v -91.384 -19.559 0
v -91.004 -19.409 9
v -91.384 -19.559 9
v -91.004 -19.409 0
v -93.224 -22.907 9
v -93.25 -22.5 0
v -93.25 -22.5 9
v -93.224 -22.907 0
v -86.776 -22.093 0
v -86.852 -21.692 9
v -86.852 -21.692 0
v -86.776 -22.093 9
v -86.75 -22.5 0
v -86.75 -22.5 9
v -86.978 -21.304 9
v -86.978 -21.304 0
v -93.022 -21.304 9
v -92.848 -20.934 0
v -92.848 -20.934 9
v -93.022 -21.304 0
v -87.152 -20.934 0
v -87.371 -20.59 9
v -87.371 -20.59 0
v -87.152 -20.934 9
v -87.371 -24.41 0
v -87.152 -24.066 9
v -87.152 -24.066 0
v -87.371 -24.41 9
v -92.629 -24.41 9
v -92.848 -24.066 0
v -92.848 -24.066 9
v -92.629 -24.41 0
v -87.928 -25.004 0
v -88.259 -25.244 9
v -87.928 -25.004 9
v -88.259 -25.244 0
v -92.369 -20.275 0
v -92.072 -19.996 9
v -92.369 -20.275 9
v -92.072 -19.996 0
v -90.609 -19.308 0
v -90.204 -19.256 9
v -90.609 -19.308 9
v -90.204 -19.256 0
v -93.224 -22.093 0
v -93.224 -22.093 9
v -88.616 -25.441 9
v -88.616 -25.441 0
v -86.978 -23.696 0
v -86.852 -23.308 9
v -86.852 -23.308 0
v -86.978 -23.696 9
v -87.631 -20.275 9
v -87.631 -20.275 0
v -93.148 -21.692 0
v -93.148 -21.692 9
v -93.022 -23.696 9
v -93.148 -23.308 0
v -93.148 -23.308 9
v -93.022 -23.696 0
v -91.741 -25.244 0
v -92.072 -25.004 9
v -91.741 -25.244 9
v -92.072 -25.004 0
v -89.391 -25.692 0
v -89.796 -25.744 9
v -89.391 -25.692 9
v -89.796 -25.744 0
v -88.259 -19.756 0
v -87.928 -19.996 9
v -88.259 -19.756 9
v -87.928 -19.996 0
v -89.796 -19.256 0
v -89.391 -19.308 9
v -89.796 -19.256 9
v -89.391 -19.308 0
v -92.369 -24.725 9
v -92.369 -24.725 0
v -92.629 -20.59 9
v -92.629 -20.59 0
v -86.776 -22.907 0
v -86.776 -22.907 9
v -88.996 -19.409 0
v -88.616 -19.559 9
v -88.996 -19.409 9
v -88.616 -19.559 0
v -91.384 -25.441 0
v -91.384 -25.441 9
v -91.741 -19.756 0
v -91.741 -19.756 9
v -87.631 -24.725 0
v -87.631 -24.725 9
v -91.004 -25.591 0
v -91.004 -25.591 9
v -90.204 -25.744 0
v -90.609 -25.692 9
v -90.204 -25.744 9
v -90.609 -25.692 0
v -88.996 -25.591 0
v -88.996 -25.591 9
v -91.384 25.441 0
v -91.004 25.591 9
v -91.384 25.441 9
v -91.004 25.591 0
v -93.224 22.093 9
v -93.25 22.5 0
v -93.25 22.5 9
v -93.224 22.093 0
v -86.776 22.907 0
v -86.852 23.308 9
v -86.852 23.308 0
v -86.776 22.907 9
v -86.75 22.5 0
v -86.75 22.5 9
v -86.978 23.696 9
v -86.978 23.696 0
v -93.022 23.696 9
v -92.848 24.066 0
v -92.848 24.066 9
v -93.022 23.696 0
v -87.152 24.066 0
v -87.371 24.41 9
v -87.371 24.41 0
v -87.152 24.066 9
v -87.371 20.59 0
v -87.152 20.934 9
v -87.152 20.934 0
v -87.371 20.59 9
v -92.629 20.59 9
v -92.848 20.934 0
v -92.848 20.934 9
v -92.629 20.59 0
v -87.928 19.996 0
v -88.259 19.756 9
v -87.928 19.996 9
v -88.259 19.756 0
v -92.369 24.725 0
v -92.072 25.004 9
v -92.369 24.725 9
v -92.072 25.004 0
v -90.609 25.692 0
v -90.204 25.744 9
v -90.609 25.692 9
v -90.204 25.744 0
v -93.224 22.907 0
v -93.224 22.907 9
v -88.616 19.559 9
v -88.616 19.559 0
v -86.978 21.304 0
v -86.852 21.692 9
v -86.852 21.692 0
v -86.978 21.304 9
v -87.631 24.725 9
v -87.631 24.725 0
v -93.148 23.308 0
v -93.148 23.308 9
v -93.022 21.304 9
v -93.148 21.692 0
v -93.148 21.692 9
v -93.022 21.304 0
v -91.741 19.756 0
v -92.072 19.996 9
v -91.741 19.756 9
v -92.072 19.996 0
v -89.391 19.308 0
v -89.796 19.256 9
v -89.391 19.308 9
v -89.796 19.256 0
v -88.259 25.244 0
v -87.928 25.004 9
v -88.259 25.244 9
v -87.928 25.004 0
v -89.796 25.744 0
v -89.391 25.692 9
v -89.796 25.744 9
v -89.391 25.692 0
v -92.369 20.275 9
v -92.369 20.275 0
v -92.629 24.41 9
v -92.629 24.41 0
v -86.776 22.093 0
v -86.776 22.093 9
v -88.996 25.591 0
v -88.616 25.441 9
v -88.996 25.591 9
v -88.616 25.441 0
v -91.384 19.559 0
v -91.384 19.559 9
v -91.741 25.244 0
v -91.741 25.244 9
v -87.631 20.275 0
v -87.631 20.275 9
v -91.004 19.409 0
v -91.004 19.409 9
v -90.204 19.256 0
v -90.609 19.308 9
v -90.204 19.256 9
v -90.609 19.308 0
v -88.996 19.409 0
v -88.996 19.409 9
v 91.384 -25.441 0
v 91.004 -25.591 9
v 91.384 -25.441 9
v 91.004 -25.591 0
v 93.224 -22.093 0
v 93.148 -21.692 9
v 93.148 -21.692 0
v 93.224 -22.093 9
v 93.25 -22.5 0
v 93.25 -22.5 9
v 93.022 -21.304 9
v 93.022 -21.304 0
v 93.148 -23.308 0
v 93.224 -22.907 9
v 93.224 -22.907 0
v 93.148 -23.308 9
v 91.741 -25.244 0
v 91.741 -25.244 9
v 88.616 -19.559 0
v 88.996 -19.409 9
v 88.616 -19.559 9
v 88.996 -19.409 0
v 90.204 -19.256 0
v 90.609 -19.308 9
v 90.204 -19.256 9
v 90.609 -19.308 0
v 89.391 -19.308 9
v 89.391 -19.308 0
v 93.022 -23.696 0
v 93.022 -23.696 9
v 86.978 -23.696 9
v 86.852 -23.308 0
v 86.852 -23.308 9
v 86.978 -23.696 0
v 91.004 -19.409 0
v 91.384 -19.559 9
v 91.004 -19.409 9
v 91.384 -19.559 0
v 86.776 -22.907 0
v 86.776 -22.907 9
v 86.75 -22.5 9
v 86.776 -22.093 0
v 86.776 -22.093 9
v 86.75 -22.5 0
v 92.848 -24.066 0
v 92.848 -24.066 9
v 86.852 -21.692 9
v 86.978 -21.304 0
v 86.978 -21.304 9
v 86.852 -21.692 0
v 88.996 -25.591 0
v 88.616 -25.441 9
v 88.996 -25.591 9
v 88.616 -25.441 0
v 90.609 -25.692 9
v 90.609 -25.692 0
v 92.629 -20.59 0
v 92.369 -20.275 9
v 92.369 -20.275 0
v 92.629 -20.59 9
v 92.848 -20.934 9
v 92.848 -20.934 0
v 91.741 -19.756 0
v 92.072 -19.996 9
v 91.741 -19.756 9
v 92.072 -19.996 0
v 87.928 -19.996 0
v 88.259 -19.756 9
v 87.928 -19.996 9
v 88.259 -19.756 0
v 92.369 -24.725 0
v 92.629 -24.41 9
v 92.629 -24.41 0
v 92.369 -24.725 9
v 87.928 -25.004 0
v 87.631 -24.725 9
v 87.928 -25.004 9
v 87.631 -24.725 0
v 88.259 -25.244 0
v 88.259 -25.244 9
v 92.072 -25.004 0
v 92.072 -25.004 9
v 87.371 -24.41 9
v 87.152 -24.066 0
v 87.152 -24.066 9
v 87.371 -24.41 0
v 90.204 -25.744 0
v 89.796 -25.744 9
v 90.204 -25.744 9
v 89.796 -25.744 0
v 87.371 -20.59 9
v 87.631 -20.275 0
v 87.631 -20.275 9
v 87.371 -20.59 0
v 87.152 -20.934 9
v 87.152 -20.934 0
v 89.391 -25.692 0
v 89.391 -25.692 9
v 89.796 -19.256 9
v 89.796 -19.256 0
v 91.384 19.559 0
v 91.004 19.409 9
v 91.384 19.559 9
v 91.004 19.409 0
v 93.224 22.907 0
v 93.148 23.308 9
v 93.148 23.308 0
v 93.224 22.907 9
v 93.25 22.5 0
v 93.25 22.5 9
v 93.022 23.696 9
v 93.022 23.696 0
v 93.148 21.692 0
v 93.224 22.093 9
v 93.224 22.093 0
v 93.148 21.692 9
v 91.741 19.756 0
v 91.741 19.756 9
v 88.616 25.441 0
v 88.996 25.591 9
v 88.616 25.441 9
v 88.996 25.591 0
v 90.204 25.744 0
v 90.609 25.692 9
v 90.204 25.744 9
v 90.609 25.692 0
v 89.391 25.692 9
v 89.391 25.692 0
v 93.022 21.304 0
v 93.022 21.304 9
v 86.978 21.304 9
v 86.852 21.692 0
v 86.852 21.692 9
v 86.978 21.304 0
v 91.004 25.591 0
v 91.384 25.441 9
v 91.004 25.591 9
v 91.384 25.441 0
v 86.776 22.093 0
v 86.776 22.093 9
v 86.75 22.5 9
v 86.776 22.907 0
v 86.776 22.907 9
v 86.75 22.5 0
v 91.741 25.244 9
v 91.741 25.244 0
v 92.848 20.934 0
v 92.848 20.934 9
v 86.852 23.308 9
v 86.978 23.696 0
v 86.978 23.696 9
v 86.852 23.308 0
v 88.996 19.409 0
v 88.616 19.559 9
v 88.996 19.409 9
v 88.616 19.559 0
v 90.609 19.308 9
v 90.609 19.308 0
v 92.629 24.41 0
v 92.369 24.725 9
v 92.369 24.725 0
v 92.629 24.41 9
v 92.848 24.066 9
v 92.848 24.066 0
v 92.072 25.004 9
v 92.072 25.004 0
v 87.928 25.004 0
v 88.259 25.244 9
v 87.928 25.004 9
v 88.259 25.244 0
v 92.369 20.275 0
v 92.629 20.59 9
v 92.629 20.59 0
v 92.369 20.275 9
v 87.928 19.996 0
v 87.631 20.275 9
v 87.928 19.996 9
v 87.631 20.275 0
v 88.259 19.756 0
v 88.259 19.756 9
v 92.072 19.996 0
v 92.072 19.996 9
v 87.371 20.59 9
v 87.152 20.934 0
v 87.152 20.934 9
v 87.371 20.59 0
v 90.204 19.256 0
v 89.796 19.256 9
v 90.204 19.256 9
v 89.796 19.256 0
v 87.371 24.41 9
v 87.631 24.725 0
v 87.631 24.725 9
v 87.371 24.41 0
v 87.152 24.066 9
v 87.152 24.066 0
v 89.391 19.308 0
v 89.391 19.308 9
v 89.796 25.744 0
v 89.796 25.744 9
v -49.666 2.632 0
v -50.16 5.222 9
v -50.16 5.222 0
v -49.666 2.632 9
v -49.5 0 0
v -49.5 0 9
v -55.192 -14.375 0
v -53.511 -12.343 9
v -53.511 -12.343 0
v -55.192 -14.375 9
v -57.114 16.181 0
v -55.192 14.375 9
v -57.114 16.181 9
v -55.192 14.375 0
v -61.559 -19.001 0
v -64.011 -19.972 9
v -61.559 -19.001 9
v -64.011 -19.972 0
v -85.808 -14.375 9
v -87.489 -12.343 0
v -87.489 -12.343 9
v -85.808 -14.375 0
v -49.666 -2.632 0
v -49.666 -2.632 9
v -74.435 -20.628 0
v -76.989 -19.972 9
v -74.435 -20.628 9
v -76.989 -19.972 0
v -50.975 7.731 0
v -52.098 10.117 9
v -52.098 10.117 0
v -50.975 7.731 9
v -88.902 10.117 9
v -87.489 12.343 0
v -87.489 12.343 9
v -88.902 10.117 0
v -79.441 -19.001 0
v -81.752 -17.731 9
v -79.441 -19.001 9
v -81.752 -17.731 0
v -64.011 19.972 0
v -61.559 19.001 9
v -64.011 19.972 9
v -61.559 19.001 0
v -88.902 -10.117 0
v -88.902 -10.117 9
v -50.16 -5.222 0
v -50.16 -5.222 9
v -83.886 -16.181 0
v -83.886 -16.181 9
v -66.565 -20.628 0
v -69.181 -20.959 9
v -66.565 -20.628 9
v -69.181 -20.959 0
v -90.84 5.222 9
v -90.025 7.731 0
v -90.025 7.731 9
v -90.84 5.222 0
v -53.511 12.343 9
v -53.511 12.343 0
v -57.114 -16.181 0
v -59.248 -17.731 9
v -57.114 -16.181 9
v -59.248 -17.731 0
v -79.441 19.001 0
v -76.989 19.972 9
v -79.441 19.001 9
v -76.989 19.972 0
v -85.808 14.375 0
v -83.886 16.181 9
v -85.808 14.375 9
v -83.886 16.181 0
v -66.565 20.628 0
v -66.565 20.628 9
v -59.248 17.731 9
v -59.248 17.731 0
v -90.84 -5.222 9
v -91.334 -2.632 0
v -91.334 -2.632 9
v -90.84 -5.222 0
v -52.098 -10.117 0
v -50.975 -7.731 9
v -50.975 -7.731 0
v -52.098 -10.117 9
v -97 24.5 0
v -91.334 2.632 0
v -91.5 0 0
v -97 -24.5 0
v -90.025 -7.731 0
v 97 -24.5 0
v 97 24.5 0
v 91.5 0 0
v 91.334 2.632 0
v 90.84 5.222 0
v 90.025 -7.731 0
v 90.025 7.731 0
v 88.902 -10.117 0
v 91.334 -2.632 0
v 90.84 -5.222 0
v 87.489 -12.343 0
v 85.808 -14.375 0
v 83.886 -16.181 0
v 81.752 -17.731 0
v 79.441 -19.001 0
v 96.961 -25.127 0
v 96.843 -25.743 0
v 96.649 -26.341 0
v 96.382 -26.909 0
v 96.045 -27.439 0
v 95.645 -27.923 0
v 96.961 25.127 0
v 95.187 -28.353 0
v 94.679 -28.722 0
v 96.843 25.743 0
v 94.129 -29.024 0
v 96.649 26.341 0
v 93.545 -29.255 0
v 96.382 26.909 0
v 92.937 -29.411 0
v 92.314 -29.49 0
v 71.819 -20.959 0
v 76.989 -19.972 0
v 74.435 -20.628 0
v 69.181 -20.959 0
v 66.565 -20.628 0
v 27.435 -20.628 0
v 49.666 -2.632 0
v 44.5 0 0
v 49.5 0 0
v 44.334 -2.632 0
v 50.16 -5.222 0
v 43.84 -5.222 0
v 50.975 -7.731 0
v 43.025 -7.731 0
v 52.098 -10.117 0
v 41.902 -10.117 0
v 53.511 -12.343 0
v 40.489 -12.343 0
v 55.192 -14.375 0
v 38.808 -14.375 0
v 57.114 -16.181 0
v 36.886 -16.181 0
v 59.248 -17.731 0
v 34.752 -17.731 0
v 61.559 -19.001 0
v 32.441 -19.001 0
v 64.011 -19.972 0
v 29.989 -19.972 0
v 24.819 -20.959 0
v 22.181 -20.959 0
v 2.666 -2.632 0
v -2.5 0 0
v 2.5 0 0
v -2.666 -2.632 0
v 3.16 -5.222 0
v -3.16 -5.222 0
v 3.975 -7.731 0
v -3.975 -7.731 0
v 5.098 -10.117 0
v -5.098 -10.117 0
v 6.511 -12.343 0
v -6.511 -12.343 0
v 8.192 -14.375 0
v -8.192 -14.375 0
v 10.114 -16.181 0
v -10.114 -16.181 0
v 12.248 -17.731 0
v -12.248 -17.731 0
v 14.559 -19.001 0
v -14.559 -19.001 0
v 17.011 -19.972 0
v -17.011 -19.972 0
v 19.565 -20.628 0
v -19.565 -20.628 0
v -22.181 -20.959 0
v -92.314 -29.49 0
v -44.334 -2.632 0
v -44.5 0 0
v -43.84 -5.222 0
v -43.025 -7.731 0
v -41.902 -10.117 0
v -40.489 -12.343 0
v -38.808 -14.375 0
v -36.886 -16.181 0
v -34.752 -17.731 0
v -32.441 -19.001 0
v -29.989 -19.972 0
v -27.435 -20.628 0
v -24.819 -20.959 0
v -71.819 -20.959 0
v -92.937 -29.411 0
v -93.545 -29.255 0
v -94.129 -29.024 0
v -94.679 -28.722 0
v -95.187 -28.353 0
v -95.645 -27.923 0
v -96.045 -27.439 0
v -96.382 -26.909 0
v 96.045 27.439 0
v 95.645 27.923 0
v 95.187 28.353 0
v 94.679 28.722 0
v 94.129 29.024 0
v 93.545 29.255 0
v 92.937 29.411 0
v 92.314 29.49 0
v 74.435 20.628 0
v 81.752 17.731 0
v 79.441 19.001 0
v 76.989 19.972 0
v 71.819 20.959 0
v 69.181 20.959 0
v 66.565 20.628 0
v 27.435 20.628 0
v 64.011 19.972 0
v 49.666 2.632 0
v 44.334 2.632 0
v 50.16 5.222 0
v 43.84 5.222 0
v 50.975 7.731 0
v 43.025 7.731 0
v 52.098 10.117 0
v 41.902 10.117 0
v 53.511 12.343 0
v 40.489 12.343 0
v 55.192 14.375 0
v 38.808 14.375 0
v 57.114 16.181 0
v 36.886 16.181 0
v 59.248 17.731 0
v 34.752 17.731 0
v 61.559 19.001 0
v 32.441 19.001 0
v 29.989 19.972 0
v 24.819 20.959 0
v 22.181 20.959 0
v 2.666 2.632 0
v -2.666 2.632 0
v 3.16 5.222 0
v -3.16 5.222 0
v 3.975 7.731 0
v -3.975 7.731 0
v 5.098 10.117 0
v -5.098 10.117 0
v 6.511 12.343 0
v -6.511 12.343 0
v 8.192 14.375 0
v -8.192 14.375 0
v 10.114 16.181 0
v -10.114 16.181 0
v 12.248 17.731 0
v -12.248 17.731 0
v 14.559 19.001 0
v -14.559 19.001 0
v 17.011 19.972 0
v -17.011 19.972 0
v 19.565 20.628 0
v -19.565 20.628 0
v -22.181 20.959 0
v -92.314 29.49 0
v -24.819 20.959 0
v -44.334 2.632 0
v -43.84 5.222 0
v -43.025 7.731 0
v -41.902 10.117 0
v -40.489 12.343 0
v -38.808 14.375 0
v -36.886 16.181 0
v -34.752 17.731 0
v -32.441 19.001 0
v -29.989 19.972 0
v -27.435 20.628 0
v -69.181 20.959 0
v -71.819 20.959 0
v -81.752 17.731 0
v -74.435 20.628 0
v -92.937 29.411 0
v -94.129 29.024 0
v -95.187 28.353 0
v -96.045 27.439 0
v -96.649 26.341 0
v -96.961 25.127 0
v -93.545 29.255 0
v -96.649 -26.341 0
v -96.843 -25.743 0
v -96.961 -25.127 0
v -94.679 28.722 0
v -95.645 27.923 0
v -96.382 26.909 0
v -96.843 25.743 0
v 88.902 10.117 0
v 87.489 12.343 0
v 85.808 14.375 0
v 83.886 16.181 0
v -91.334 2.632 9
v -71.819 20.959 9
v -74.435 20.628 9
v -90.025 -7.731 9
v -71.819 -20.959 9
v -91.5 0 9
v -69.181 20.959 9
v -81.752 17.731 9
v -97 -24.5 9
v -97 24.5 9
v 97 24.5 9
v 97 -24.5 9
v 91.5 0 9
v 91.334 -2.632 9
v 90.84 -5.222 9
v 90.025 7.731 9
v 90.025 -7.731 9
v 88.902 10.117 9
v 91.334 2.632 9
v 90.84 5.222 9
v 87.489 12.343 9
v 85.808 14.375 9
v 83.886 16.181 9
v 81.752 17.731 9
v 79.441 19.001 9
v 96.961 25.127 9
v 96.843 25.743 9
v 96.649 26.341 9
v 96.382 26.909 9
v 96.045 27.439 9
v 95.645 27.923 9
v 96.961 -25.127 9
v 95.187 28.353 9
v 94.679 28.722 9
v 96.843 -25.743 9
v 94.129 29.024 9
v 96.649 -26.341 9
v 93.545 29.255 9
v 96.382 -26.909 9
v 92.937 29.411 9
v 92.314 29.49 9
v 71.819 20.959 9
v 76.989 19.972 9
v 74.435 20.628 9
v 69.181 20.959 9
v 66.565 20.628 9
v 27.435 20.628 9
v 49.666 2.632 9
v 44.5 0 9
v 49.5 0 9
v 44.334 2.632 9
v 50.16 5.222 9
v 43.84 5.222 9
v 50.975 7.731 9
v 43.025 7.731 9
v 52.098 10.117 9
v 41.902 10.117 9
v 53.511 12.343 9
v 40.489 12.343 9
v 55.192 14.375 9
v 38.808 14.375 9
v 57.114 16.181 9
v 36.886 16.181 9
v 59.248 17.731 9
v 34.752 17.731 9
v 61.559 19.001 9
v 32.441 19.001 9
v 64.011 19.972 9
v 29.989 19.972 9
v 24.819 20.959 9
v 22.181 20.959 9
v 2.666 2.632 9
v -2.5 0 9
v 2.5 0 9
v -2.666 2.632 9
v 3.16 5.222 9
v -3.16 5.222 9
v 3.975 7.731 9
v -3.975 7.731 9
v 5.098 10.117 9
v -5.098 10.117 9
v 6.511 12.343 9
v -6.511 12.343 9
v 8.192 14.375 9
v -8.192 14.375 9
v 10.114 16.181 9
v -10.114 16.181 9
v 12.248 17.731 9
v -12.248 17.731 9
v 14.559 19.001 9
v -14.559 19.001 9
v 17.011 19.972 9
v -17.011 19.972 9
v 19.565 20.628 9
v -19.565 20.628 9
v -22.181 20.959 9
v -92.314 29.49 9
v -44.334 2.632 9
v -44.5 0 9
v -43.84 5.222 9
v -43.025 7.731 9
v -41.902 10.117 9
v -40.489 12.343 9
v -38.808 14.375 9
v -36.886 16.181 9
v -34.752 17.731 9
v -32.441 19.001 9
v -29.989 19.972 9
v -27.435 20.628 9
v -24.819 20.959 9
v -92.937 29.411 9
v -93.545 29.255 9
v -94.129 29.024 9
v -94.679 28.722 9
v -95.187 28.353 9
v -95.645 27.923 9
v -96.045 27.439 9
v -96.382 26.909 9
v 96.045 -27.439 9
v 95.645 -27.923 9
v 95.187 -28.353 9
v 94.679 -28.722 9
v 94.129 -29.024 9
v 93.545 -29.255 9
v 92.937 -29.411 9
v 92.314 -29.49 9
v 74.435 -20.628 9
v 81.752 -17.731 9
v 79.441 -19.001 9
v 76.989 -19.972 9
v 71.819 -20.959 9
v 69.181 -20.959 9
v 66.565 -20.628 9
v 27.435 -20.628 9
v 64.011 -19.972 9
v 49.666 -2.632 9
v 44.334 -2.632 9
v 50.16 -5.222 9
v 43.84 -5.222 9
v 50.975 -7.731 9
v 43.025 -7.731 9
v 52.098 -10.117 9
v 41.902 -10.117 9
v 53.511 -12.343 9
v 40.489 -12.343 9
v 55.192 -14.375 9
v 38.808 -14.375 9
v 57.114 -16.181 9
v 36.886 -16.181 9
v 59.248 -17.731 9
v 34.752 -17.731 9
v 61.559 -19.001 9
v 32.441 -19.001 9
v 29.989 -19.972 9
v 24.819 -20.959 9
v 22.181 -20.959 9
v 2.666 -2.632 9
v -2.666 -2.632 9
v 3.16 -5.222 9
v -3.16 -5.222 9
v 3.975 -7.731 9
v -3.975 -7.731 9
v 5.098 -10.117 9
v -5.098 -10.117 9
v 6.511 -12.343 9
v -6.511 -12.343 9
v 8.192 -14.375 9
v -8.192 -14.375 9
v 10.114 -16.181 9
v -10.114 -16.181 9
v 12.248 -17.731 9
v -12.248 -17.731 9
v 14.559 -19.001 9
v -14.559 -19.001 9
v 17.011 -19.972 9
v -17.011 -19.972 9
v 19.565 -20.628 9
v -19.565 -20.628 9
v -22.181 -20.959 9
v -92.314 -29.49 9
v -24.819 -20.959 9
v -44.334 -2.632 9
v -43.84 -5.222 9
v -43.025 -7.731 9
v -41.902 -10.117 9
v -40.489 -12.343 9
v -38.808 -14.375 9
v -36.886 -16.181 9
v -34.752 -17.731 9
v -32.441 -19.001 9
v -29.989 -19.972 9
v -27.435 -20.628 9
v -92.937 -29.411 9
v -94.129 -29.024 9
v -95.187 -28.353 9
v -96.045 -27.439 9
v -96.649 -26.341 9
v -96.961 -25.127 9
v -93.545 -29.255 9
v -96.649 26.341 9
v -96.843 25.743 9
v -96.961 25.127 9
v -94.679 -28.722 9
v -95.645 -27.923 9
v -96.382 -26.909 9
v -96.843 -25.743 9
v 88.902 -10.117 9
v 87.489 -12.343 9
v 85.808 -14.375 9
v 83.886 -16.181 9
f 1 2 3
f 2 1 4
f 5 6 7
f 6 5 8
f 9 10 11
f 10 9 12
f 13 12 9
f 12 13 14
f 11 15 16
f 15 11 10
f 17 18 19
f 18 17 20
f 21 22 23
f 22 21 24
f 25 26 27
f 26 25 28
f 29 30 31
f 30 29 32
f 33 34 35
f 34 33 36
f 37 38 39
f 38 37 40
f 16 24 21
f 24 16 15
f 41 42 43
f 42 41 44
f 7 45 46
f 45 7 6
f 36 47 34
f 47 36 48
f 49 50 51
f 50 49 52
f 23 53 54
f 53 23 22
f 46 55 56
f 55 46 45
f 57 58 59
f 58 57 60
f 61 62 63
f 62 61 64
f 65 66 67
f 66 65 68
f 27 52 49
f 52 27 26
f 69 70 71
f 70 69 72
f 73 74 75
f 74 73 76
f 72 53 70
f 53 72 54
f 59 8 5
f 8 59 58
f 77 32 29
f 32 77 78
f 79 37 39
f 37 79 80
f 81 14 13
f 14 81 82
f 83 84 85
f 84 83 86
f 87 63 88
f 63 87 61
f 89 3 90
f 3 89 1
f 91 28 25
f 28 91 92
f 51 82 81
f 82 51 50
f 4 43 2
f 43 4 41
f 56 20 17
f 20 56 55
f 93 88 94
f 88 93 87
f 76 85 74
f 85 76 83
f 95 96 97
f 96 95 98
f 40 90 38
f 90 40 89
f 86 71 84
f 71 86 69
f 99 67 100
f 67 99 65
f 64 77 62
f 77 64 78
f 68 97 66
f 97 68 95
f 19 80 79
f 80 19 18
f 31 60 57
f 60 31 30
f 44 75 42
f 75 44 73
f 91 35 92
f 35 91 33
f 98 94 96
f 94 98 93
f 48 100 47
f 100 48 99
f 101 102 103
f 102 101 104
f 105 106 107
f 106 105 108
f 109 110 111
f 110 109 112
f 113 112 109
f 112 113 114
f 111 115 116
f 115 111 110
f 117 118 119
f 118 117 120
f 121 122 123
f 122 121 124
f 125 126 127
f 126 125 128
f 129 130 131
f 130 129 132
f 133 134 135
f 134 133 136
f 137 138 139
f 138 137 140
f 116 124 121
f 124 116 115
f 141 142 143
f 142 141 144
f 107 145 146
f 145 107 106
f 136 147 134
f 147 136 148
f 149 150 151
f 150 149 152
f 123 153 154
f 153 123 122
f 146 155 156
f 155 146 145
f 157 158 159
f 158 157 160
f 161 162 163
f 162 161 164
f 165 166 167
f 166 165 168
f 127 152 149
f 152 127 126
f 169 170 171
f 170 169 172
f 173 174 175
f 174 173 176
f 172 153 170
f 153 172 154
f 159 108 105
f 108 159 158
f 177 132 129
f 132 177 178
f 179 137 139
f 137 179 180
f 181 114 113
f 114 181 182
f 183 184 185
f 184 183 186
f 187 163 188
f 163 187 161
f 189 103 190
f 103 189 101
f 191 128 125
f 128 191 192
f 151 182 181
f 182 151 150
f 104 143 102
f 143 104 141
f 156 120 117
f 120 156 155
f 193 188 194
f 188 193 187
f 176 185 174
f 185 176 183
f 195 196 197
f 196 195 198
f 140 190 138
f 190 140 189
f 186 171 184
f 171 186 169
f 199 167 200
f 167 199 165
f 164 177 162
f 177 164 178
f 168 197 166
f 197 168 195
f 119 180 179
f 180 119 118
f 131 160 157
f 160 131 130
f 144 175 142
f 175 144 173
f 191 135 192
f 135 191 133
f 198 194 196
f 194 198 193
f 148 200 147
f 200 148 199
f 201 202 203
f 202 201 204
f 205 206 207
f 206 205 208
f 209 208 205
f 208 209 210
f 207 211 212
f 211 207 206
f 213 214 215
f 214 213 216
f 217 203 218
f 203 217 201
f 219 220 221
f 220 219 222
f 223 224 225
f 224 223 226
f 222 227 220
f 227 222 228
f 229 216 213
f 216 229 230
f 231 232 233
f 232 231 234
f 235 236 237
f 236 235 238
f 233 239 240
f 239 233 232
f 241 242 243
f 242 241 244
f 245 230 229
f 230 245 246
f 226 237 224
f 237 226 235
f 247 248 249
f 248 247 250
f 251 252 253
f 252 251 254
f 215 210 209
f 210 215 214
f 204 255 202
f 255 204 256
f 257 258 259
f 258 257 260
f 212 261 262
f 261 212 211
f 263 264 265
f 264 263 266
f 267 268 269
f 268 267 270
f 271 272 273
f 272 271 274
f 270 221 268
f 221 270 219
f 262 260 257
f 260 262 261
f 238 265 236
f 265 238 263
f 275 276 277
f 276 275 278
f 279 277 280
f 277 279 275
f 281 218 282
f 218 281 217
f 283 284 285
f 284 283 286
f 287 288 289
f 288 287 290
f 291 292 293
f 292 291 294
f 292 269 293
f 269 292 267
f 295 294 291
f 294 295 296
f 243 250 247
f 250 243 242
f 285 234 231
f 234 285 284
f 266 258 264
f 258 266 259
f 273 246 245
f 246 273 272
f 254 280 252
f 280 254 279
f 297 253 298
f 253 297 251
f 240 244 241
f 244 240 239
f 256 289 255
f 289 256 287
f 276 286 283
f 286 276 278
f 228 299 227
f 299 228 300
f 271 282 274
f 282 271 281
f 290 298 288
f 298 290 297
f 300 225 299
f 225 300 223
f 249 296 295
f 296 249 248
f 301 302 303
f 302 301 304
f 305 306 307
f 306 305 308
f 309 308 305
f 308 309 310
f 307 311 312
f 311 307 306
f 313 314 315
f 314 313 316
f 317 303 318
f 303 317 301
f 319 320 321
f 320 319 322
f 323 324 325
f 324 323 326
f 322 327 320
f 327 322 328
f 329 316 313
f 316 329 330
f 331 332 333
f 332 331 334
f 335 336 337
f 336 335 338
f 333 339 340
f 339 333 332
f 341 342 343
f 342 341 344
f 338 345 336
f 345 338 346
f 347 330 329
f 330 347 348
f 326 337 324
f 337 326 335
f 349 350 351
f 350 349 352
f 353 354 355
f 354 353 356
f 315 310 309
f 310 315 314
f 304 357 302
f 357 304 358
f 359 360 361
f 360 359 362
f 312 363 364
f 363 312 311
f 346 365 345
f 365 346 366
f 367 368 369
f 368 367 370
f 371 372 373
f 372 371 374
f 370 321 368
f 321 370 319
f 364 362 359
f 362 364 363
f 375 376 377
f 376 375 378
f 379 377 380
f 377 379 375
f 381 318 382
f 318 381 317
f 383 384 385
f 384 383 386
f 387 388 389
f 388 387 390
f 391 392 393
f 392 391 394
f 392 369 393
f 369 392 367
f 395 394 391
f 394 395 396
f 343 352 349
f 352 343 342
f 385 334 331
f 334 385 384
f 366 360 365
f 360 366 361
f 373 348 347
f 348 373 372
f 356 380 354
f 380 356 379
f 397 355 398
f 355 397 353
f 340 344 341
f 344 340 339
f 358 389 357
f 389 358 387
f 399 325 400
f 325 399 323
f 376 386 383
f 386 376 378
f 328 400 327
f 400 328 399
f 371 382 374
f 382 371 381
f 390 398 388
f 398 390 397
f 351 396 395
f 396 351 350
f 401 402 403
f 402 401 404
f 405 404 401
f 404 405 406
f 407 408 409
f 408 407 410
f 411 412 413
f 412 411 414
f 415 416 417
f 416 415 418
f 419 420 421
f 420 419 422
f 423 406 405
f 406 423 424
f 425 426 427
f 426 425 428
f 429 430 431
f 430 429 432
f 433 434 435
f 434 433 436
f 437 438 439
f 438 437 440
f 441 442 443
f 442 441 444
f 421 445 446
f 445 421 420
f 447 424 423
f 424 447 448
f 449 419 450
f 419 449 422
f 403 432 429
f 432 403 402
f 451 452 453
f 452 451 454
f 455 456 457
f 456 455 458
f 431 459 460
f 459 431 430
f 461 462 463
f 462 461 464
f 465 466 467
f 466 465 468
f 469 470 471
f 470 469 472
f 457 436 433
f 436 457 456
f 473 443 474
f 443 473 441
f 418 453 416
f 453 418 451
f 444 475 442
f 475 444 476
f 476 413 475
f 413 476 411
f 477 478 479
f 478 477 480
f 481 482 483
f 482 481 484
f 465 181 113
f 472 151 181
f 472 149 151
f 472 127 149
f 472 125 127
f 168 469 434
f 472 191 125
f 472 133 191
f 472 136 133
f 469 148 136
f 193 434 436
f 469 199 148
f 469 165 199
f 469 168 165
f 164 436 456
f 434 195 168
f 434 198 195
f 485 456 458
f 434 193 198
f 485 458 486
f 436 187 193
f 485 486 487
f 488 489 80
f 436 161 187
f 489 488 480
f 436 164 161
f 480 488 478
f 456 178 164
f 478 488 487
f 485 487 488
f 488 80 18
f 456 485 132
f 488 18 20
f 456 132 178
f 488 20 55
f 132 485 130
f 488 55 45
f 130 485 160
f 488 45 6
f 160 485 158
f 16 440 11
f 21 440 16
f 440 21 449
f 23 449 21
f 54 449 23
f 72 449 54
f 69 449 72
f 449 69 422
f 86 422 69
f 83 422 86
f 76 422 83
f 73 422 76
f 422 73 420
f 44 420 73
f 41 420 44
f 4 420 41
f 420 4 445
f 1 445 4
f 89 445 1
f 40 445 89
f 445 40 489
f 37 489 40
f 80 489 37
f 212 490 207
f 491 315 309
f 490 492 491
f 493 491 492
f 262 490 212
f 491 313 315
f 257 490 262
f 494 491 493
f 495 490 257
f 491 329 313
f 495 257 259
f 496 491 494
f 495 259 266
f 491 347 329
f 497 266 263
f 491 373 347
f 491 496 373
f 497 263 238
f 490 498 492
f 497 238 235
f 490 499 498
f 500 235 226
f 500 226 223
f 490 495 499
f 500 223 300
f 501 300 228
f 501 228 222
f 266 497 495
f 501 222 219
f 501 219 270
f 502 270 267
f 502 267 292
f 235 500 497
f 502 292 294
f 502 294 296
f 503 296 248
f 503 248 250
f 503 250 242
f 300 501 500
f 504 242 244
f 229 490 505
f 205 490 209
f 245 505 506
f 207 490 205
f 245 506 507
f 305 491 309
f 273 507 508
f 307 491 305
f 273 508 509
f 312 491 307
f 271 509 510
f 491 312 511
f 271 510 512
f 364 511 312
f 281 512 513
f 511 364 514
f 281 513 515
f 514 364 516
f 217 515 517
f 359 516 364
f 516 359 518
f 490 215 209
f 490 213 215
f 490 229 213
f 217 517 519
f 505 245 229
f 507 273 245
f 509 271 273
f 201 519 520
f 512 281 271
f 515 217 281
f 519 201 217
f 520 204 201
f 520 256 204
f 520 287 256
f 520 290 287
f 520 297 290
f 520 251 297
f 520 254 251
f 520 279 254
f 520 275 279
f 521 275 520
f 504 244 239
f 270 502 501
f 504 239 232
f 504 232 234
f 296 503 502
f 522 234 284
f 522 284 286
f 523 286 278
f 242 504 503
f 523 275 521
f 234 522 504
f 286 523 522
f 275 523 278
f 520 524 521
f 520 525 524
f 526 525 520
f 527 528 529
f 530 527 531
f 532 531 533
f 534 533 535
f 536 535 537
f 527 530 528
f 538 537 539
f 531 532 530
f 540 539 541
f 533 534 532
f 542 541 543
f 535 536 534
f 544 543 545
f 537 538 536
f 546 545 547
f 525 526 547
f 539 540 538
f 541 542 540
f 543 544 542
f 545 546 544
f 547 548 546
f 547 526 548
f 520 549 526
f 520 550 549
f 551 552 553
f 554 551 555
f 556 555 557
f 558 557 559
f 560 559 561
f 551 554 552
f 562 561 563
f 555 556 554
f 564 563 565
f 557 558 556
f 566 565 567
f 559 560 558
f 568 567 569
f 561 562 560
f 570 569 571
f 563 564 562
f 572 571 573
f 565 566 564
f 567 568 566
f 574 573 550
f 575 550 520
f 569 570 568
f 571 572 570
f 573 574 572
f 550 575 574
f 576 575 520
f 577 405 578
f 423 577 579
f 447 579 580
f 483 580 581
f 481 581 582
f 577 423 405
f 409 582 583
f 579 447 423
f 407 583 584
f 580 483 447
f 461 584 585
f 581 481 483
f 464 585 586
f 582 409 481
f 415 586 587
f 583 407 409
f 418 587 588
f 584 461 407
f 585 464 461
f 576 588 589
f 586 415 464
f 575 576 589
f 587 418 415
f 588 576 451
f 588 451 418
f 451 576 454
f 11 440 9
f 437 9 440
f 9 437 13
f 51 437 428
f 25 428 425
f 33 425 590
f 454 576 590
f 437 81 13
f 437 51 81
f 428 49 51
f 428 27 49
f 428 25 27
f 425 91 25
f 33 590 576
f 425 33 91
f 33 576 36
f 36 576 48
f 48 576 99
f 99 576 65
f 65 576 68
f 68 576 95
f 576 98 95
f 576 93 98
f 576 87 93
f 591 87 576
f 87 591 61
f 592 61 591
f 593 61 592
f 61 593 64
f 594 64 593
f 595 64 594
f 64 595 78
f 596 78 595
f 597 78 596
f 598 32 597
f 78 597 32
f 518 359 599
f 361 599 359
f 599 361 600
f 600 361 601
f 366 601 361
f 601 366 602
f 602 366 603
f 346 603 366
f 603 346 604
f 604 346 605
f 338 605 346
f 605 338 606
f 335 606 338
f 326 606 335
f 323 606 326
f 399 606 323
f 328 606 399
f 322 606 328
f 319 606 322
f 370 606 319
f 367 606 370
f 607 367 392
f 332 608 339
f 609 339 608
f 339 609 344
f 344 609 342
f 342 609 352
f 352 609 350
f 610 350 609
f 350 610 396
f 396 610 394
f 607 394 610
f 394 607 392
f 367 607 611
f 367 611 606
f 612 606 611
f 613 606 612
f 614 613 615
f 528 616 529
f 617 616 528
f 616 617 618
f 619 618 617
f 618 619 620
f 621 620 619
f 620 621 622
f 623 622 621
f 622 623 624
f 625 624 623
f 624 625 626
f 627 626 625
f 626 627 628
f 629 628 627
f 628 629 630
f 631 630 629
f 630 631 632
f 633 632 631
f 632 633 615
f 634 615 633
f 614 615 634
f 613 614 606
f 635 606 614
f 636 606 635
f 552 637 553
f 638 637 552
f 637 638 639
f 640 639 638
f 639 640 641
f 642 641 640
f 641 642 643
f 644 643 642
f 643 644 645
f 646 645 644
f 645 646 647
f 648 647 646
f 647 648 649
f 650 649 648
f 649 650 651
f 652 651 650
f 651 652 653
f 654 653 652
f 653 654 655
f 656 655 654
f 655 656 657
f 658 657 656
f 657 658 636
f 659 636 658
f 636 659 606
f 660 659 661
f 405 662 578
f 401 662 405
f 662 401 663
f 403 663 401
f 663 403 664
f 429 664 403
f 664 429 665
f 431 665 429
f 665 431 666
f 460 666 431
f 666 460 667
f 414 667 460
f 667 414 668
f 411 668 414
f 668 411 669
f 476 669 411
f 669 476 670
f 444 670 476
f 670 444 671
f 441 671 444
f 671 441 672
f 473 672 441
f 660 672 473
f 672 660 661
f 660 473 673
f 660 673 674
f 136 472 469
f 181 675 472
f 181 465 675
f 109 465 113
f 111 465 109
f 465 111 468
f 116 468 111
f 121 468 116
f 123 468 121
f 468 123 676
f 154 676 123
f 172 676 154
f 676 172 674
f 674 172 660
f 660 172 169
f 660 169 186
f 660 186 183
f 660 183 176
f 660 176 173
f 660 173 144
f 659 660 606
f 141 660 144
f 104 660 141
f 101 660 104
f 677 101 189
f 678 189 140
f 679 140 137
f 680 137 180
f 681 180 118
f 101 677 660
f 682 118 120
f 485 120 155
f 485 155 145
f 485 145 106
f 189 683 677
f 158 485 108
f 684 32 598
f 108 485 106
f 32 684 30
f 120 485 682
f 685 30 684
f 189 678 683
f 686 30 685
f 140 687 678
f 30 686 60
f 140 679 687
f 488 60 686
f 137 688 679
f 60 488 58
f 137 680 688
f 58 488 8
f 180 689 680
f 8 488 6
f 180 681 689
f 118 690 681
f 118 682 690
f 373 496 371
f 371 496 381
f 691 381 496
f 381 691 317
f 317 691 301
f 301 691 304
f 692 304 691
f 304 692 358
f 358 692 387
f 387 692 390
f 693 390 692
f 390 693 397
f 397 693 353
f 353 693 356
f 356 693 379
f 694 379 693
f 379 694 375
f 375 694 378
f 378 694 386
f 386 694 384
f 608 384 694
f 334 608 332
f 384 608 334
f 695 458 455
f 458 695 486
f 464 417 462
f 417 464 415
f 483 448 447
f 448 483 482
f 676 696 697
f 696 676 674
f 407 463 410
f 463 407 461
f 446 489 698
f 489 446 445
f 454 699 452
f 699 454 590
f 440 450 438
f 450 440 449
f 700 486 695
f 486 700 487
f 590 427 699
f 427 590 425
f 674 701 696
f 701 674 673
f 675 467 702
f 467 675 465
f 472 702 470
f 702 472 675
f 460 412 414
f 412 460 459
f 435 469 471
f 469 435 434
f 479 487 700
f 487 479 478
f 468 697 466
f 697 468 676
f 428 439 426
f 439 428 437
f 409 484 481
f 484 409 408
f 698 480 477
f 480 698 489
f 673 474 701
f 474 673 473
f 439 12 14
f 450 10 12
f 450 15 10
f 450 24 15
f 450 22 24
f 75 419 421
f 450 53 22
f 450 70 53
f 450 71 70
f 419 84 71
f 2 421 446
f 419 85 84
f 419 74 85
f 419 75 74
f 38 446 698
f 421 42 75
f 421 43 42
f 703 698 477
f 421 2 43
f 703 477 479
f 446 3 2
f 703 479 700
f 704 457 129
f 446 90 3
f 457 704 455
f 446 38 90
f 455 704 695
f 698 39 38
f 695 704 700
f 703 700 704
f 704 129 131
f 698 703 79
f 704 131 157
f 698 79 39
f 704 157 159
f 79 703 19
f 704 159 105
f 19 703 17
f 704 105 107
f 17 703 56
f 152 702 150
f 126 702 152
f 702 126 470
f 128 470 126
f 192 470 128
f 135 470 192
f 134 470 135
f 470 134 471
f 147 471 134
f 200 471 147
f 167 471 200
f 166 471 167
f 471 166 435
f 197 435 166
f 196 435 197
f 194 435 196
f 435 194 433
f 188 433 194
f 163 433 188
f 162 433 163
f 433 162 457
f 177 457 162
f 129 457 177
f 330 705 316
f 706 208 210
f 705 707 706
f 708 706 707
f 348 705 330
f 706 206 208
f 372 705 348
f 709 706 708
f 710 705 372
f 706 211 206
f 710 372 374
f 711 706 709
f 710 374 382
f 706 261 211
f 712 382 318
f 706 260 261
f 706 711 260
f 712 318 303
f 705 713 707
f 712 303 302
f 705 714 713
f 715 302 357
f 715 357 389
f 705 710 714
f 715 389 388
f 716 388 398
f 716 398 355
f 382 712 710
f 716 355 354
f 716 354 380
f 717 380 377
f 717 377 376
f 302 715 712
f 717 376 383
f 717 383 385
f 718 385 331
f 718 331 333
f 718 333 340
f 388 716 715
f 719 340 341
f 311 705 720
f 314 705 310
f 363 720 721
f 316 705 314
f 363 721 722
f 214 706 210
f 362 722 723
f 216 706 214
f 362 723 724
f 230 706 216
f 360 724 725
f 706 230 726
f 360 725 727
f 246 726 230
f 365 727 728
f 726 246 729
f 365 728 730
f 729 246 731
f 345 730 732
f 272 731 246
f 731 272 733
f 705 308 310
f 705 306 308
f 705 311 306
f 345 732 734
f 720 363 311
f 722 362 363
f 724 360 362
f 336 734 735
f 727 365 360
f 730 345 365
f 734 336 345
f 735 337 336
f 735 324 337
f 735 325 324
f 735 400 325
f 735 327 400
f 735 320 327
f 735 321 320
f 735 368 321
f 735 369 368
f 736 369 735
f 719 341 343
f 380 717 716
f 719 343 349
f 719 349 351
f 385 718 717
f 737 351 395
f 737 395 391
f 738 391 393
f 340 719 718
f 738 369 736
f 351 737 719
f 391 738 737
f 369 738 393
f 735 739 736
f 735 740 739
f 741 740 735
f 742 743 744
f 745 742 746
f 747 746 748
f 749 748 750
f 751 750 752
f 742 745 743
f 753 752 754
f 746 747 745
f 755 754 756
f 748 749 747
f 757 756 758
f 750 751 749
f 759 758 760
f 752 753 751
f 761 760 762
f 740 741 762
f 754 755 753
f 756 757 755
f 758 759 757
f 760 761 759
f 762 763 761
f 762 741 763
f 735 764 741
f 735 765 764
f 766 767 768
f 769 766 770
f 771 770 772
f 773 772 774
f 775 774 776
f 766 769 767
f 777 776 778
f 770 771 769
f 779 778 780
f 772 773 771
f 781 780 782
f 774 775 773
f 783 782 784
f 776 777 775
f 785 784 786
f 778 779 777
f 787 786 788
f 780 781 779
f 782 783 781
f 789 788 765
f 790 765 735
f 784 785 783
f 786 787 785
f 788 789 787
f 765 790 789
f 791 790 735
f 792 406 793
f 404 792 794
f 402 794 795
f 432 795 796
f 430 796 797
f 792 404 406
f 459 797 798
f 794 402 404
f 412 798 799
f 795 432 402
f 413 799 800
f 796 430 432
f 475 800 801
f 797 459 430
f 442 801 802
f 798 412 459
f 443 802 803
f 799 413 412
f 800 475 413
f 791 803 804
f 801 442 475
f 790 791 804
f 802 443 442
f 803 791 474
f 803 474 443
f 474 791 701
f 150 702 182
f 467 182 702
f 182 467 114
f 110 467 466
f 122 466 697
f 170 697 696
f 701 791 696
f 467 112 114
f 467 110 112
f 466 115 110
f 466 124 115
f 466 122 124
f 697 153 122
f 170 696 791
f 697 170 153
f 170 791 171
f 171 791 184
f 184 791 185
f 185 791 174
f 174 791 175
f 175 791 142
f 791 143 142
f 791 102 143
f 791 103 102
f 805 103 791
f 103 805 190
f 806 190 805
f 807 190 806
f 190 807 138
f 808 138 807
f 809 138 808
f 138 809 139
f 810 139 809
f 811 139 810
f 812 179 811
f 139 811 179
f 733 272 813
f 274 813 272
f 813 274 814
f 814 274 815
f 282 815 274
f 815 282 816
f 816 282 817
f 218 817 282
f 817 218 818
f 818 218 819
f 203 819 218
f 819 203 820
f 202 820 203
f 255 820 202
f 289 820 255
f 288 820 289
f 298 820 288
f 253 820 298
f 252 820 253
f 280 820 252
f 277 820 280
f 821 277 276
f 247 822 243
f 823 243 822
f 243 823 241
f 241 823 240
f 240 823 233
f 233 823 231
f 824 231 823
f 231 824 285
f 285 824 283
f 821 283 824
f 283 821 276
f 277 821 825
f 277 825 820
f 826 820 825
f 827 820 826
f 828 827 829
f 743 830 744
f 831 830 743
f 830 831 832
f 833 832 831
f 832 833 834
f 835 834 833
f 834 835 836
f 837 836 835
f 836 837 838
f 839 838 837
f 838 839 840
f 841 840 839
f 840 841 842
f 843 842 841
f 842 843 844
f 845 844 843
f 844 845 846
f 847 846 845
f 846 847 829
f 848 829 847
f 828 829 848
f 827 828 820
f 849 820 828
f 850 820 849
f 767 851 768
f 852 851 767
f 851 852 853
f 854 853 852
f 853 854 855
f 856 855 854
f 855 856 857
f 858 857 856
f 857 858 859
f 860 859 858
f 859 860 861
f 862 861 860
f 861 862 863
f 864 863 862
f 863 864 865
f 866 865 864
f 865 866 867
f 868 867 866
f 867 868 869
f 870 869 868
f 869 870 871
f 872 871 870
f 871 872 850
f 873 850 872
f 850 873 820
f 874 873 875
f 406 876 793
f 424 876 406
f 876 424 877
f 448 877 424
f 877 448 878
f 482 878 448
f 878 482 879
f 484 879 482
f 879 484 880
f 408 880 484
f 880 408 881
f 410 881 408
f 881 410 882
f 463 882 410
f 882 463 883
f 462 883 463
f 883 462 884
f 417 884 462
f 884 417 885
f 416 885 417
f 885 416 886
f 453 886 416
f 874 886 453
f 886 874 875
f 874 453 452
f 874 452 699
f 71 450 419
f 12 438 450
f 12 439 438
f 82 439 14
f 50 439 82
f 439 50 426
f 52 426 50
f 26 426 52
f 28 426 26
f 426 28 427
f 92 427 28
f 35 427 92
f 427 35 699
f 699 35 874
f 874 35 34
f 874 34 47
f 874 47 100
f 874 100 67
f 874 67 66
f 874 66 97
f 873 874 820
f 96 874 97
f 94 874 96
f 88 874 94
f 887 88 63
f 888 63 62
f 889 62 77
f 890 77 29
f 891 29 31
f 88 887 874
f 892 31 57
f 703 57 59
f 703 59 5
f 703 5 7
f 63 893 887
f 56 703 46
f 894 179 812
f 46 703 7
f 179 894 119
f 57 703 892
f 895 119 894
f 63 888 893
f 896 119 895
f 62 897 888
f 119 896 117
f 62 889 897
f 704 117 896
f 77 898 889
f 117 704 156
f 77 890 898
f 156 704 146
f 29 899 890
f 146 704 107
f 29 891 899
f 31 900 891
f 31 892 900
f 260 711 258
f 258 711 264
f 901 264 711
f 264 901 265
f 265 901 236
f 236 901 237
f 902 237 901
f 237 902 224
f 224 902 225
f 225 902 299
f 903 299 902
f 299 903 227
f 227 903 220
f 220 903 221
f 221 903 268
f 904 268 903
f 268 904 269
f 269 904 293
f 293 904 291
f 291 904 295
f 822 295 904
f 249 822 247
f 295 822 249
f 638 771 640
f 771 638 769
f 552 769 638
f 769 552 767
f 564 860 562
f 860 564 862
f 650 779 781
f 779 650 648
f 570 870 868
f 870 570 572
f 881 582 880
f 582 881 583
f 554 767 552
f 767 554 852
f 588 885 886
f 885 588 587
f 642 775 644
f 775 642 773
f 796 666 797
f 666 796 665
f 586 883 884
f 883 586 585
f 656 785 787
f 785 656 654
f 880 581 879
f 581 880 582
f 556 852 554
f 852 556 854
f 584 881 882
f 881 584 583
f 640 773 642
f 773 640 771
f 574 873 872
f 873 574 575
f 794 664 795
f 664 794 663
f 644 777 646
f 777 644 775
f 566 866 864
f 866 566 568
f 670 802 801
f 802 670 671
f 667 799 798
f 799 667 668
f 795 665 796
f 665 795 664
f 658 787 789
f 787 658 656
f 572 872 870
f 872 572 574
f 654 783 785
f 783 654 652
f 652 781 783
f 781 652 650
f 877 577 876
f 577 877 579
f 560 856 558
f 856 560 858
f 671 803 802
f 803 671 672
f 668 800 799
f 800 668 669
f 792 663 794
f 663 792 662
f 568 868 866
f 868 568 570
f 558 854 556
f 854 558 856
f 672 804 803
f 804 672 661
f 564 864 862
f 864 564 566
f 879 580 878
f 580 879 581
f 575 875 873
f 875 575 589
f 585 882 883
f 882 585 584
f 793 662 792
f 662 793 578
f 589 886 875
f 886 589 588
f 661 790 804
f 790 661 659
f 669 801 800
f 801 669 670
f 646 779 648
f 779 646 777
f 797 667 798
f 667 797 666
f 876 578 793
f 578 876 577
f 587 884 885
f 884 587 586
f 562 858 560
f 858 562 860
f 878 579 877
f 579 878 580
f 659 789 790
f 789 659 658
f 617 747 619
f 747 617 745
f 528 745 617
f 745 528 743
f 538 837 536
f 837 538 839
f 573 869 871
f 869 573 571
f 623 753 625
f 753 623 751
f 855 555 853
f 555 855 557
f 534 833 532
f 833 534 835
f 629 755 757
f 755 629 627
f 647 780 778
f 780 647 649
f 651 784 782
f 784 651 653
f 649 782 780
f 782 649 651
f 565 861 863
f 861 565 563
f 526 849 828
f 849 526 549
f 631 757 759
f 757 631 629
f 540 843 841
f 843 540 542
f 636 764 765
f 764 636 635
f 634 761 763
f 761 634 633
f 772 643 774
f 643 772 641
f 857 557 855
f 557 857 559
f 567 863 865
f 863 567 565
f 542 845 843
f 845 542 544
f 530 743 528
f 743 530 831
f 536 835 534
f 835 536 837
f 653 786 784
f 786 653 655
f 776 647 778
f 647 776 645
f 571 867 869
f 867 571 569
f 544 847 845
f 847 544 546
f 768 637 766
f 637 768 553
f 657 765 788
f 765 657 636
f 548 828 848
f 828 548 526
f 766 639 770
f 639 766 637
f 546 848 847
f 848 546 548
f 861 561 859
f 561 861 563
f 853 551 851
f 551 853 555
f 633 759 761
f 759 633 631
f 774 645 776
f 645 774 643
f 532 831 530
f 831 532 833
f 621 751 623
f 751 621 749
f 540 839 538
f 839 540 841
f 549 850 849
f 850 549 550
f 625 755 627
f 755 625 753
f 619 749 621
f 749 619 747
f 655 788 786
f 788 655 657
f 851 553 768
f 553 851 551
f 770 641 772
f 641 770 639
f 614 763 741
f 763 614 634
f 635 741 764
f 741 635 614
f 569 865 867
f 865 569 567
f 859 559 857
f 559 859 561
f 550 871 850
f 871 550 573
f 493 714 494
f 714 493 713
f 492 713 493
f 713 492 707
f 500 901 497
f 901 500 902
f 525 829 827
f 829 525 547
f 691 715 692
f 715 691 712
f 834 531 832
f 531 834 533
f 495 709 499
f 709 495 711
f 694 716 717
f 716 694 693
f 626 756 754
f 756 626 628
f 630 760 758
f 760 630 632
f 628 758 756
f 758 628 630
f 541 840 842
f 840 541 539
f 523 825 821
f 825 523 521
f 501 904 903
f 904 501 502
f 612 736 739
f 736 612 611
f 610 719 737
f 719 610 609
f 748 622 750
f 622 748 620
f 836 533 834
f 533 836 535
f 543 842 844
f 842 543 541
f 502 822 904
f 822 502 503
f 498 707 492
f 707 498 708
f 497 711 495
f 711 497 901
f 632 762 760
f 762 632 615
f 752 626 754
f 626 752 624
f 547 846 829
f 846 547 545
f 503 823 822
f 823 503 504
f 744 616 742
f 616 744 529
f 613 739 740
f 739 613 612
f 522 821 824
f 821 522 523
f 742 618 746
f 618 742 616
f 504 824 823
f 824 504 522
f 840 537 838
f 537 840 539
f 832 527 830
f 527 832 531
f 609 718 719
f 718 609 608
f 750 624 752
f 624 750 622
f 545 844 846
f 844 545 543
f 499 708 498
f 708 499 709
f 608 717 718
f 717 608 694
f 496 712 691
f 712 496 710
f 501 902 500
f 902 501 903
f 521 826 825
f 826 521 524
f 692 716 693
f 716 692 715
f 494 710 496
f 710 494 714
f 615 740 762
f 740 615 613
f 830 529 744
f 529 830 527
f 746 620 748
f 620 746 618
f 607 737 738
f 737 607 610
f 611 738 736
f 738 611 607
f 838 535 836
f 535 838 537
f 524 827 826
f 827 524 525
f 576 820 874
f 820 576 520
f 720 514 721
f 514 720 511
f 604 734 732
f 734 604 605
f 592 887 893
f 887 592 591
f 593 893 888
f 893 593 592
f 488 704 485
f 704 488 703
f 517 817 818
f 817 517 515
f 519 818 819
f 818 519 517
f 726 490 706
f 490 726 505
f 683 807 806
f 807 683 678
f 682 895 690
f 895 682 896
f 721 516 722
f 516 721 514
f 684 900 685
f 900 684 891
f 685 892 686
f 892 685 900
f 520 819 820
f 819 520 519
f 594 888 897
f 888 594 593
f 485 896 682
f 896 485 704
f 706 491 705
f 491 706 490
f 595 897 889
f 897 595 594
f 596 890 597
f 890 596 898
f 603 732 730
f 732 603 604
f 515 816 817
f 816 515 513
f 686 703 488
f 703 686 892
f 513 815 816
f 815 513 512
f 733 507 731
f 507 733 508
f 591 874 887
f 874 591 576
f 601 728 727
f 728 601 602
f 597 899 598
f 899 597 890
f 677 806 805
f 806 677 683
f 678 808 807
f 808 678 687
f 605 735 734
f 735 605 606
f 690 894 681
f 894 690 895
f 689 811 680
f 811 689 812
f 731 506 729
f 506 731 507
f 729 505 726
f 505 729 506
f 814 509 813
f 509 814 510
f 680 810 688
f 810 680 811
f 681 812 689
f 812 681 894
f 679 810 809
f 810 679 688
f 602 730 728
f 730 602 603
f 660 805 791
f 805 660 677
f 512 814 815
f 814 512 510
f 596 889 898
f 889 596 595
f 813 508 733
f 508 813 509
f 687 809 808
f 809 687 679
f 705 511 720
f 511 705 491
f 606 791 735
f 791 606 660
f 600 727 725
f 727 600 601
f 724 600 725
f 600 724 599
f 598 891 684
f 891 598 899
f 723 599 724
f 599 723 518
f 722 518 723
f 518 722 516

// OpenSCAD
$fn = 50;


difference() {
	union() {
		hull() {
			translate(v = [-92.0000000000, 24.5000000000, 0]) {
				cylinder(h = 9, r = 5);
			}
			translate(v = [92.0000000000, 24.5000000000, 0]) {
				cylinder(h = 9, r = 5);
			}
			translate(v = [-92.0000000000, -24.5000000000, 0]) {
				cylinder(h = 9, r = 5);
			}
			translate(v = [92.0000000000, -24.5000000000, 0]) {
				cylinder(h = 9, r = 5);
			}
		}
	}
	union() {
		#translate(v = [-90.0000000000, -22.5000000000, -100.0000000000]) {
			cylinder(h = 200, r = 3.2500000000);
		}
		#translate(v = [-90.0000000000, 22.5000000000, -100.0000000000]) {
			cylinder(h = 200, r = 3.2500000000);
		}
		#translate(v = [90.0000000000, -22.5000000000, -100.0000000000]) {
			cylinder(h = 200, r = 3.2500000000);
		}
		#translate(v = [90.0000000000, 22.5000000000, -100.0000000000]) {
			cylinder(h = 200, r = 3.2500000000);
		}
		#translate(v = [-70.5000000000, 0, 0]) {
			cylinder(h = 9, r = 21.0000000000);
		}
		#translate(v = [-23.5000000000, 0, 0]) {
			cylinder(h = 9, r = 21.0000000000);
		}
		#translate(v = [23.5000000000, 0, 0]) {
			cylinder(h = 9, r = 21.0000000000);
		}
		#translate(v = [70.5000000000, 0, 0]) {
			cylinder(h = 9, r = 21.0000000000);
		}
	}
}
